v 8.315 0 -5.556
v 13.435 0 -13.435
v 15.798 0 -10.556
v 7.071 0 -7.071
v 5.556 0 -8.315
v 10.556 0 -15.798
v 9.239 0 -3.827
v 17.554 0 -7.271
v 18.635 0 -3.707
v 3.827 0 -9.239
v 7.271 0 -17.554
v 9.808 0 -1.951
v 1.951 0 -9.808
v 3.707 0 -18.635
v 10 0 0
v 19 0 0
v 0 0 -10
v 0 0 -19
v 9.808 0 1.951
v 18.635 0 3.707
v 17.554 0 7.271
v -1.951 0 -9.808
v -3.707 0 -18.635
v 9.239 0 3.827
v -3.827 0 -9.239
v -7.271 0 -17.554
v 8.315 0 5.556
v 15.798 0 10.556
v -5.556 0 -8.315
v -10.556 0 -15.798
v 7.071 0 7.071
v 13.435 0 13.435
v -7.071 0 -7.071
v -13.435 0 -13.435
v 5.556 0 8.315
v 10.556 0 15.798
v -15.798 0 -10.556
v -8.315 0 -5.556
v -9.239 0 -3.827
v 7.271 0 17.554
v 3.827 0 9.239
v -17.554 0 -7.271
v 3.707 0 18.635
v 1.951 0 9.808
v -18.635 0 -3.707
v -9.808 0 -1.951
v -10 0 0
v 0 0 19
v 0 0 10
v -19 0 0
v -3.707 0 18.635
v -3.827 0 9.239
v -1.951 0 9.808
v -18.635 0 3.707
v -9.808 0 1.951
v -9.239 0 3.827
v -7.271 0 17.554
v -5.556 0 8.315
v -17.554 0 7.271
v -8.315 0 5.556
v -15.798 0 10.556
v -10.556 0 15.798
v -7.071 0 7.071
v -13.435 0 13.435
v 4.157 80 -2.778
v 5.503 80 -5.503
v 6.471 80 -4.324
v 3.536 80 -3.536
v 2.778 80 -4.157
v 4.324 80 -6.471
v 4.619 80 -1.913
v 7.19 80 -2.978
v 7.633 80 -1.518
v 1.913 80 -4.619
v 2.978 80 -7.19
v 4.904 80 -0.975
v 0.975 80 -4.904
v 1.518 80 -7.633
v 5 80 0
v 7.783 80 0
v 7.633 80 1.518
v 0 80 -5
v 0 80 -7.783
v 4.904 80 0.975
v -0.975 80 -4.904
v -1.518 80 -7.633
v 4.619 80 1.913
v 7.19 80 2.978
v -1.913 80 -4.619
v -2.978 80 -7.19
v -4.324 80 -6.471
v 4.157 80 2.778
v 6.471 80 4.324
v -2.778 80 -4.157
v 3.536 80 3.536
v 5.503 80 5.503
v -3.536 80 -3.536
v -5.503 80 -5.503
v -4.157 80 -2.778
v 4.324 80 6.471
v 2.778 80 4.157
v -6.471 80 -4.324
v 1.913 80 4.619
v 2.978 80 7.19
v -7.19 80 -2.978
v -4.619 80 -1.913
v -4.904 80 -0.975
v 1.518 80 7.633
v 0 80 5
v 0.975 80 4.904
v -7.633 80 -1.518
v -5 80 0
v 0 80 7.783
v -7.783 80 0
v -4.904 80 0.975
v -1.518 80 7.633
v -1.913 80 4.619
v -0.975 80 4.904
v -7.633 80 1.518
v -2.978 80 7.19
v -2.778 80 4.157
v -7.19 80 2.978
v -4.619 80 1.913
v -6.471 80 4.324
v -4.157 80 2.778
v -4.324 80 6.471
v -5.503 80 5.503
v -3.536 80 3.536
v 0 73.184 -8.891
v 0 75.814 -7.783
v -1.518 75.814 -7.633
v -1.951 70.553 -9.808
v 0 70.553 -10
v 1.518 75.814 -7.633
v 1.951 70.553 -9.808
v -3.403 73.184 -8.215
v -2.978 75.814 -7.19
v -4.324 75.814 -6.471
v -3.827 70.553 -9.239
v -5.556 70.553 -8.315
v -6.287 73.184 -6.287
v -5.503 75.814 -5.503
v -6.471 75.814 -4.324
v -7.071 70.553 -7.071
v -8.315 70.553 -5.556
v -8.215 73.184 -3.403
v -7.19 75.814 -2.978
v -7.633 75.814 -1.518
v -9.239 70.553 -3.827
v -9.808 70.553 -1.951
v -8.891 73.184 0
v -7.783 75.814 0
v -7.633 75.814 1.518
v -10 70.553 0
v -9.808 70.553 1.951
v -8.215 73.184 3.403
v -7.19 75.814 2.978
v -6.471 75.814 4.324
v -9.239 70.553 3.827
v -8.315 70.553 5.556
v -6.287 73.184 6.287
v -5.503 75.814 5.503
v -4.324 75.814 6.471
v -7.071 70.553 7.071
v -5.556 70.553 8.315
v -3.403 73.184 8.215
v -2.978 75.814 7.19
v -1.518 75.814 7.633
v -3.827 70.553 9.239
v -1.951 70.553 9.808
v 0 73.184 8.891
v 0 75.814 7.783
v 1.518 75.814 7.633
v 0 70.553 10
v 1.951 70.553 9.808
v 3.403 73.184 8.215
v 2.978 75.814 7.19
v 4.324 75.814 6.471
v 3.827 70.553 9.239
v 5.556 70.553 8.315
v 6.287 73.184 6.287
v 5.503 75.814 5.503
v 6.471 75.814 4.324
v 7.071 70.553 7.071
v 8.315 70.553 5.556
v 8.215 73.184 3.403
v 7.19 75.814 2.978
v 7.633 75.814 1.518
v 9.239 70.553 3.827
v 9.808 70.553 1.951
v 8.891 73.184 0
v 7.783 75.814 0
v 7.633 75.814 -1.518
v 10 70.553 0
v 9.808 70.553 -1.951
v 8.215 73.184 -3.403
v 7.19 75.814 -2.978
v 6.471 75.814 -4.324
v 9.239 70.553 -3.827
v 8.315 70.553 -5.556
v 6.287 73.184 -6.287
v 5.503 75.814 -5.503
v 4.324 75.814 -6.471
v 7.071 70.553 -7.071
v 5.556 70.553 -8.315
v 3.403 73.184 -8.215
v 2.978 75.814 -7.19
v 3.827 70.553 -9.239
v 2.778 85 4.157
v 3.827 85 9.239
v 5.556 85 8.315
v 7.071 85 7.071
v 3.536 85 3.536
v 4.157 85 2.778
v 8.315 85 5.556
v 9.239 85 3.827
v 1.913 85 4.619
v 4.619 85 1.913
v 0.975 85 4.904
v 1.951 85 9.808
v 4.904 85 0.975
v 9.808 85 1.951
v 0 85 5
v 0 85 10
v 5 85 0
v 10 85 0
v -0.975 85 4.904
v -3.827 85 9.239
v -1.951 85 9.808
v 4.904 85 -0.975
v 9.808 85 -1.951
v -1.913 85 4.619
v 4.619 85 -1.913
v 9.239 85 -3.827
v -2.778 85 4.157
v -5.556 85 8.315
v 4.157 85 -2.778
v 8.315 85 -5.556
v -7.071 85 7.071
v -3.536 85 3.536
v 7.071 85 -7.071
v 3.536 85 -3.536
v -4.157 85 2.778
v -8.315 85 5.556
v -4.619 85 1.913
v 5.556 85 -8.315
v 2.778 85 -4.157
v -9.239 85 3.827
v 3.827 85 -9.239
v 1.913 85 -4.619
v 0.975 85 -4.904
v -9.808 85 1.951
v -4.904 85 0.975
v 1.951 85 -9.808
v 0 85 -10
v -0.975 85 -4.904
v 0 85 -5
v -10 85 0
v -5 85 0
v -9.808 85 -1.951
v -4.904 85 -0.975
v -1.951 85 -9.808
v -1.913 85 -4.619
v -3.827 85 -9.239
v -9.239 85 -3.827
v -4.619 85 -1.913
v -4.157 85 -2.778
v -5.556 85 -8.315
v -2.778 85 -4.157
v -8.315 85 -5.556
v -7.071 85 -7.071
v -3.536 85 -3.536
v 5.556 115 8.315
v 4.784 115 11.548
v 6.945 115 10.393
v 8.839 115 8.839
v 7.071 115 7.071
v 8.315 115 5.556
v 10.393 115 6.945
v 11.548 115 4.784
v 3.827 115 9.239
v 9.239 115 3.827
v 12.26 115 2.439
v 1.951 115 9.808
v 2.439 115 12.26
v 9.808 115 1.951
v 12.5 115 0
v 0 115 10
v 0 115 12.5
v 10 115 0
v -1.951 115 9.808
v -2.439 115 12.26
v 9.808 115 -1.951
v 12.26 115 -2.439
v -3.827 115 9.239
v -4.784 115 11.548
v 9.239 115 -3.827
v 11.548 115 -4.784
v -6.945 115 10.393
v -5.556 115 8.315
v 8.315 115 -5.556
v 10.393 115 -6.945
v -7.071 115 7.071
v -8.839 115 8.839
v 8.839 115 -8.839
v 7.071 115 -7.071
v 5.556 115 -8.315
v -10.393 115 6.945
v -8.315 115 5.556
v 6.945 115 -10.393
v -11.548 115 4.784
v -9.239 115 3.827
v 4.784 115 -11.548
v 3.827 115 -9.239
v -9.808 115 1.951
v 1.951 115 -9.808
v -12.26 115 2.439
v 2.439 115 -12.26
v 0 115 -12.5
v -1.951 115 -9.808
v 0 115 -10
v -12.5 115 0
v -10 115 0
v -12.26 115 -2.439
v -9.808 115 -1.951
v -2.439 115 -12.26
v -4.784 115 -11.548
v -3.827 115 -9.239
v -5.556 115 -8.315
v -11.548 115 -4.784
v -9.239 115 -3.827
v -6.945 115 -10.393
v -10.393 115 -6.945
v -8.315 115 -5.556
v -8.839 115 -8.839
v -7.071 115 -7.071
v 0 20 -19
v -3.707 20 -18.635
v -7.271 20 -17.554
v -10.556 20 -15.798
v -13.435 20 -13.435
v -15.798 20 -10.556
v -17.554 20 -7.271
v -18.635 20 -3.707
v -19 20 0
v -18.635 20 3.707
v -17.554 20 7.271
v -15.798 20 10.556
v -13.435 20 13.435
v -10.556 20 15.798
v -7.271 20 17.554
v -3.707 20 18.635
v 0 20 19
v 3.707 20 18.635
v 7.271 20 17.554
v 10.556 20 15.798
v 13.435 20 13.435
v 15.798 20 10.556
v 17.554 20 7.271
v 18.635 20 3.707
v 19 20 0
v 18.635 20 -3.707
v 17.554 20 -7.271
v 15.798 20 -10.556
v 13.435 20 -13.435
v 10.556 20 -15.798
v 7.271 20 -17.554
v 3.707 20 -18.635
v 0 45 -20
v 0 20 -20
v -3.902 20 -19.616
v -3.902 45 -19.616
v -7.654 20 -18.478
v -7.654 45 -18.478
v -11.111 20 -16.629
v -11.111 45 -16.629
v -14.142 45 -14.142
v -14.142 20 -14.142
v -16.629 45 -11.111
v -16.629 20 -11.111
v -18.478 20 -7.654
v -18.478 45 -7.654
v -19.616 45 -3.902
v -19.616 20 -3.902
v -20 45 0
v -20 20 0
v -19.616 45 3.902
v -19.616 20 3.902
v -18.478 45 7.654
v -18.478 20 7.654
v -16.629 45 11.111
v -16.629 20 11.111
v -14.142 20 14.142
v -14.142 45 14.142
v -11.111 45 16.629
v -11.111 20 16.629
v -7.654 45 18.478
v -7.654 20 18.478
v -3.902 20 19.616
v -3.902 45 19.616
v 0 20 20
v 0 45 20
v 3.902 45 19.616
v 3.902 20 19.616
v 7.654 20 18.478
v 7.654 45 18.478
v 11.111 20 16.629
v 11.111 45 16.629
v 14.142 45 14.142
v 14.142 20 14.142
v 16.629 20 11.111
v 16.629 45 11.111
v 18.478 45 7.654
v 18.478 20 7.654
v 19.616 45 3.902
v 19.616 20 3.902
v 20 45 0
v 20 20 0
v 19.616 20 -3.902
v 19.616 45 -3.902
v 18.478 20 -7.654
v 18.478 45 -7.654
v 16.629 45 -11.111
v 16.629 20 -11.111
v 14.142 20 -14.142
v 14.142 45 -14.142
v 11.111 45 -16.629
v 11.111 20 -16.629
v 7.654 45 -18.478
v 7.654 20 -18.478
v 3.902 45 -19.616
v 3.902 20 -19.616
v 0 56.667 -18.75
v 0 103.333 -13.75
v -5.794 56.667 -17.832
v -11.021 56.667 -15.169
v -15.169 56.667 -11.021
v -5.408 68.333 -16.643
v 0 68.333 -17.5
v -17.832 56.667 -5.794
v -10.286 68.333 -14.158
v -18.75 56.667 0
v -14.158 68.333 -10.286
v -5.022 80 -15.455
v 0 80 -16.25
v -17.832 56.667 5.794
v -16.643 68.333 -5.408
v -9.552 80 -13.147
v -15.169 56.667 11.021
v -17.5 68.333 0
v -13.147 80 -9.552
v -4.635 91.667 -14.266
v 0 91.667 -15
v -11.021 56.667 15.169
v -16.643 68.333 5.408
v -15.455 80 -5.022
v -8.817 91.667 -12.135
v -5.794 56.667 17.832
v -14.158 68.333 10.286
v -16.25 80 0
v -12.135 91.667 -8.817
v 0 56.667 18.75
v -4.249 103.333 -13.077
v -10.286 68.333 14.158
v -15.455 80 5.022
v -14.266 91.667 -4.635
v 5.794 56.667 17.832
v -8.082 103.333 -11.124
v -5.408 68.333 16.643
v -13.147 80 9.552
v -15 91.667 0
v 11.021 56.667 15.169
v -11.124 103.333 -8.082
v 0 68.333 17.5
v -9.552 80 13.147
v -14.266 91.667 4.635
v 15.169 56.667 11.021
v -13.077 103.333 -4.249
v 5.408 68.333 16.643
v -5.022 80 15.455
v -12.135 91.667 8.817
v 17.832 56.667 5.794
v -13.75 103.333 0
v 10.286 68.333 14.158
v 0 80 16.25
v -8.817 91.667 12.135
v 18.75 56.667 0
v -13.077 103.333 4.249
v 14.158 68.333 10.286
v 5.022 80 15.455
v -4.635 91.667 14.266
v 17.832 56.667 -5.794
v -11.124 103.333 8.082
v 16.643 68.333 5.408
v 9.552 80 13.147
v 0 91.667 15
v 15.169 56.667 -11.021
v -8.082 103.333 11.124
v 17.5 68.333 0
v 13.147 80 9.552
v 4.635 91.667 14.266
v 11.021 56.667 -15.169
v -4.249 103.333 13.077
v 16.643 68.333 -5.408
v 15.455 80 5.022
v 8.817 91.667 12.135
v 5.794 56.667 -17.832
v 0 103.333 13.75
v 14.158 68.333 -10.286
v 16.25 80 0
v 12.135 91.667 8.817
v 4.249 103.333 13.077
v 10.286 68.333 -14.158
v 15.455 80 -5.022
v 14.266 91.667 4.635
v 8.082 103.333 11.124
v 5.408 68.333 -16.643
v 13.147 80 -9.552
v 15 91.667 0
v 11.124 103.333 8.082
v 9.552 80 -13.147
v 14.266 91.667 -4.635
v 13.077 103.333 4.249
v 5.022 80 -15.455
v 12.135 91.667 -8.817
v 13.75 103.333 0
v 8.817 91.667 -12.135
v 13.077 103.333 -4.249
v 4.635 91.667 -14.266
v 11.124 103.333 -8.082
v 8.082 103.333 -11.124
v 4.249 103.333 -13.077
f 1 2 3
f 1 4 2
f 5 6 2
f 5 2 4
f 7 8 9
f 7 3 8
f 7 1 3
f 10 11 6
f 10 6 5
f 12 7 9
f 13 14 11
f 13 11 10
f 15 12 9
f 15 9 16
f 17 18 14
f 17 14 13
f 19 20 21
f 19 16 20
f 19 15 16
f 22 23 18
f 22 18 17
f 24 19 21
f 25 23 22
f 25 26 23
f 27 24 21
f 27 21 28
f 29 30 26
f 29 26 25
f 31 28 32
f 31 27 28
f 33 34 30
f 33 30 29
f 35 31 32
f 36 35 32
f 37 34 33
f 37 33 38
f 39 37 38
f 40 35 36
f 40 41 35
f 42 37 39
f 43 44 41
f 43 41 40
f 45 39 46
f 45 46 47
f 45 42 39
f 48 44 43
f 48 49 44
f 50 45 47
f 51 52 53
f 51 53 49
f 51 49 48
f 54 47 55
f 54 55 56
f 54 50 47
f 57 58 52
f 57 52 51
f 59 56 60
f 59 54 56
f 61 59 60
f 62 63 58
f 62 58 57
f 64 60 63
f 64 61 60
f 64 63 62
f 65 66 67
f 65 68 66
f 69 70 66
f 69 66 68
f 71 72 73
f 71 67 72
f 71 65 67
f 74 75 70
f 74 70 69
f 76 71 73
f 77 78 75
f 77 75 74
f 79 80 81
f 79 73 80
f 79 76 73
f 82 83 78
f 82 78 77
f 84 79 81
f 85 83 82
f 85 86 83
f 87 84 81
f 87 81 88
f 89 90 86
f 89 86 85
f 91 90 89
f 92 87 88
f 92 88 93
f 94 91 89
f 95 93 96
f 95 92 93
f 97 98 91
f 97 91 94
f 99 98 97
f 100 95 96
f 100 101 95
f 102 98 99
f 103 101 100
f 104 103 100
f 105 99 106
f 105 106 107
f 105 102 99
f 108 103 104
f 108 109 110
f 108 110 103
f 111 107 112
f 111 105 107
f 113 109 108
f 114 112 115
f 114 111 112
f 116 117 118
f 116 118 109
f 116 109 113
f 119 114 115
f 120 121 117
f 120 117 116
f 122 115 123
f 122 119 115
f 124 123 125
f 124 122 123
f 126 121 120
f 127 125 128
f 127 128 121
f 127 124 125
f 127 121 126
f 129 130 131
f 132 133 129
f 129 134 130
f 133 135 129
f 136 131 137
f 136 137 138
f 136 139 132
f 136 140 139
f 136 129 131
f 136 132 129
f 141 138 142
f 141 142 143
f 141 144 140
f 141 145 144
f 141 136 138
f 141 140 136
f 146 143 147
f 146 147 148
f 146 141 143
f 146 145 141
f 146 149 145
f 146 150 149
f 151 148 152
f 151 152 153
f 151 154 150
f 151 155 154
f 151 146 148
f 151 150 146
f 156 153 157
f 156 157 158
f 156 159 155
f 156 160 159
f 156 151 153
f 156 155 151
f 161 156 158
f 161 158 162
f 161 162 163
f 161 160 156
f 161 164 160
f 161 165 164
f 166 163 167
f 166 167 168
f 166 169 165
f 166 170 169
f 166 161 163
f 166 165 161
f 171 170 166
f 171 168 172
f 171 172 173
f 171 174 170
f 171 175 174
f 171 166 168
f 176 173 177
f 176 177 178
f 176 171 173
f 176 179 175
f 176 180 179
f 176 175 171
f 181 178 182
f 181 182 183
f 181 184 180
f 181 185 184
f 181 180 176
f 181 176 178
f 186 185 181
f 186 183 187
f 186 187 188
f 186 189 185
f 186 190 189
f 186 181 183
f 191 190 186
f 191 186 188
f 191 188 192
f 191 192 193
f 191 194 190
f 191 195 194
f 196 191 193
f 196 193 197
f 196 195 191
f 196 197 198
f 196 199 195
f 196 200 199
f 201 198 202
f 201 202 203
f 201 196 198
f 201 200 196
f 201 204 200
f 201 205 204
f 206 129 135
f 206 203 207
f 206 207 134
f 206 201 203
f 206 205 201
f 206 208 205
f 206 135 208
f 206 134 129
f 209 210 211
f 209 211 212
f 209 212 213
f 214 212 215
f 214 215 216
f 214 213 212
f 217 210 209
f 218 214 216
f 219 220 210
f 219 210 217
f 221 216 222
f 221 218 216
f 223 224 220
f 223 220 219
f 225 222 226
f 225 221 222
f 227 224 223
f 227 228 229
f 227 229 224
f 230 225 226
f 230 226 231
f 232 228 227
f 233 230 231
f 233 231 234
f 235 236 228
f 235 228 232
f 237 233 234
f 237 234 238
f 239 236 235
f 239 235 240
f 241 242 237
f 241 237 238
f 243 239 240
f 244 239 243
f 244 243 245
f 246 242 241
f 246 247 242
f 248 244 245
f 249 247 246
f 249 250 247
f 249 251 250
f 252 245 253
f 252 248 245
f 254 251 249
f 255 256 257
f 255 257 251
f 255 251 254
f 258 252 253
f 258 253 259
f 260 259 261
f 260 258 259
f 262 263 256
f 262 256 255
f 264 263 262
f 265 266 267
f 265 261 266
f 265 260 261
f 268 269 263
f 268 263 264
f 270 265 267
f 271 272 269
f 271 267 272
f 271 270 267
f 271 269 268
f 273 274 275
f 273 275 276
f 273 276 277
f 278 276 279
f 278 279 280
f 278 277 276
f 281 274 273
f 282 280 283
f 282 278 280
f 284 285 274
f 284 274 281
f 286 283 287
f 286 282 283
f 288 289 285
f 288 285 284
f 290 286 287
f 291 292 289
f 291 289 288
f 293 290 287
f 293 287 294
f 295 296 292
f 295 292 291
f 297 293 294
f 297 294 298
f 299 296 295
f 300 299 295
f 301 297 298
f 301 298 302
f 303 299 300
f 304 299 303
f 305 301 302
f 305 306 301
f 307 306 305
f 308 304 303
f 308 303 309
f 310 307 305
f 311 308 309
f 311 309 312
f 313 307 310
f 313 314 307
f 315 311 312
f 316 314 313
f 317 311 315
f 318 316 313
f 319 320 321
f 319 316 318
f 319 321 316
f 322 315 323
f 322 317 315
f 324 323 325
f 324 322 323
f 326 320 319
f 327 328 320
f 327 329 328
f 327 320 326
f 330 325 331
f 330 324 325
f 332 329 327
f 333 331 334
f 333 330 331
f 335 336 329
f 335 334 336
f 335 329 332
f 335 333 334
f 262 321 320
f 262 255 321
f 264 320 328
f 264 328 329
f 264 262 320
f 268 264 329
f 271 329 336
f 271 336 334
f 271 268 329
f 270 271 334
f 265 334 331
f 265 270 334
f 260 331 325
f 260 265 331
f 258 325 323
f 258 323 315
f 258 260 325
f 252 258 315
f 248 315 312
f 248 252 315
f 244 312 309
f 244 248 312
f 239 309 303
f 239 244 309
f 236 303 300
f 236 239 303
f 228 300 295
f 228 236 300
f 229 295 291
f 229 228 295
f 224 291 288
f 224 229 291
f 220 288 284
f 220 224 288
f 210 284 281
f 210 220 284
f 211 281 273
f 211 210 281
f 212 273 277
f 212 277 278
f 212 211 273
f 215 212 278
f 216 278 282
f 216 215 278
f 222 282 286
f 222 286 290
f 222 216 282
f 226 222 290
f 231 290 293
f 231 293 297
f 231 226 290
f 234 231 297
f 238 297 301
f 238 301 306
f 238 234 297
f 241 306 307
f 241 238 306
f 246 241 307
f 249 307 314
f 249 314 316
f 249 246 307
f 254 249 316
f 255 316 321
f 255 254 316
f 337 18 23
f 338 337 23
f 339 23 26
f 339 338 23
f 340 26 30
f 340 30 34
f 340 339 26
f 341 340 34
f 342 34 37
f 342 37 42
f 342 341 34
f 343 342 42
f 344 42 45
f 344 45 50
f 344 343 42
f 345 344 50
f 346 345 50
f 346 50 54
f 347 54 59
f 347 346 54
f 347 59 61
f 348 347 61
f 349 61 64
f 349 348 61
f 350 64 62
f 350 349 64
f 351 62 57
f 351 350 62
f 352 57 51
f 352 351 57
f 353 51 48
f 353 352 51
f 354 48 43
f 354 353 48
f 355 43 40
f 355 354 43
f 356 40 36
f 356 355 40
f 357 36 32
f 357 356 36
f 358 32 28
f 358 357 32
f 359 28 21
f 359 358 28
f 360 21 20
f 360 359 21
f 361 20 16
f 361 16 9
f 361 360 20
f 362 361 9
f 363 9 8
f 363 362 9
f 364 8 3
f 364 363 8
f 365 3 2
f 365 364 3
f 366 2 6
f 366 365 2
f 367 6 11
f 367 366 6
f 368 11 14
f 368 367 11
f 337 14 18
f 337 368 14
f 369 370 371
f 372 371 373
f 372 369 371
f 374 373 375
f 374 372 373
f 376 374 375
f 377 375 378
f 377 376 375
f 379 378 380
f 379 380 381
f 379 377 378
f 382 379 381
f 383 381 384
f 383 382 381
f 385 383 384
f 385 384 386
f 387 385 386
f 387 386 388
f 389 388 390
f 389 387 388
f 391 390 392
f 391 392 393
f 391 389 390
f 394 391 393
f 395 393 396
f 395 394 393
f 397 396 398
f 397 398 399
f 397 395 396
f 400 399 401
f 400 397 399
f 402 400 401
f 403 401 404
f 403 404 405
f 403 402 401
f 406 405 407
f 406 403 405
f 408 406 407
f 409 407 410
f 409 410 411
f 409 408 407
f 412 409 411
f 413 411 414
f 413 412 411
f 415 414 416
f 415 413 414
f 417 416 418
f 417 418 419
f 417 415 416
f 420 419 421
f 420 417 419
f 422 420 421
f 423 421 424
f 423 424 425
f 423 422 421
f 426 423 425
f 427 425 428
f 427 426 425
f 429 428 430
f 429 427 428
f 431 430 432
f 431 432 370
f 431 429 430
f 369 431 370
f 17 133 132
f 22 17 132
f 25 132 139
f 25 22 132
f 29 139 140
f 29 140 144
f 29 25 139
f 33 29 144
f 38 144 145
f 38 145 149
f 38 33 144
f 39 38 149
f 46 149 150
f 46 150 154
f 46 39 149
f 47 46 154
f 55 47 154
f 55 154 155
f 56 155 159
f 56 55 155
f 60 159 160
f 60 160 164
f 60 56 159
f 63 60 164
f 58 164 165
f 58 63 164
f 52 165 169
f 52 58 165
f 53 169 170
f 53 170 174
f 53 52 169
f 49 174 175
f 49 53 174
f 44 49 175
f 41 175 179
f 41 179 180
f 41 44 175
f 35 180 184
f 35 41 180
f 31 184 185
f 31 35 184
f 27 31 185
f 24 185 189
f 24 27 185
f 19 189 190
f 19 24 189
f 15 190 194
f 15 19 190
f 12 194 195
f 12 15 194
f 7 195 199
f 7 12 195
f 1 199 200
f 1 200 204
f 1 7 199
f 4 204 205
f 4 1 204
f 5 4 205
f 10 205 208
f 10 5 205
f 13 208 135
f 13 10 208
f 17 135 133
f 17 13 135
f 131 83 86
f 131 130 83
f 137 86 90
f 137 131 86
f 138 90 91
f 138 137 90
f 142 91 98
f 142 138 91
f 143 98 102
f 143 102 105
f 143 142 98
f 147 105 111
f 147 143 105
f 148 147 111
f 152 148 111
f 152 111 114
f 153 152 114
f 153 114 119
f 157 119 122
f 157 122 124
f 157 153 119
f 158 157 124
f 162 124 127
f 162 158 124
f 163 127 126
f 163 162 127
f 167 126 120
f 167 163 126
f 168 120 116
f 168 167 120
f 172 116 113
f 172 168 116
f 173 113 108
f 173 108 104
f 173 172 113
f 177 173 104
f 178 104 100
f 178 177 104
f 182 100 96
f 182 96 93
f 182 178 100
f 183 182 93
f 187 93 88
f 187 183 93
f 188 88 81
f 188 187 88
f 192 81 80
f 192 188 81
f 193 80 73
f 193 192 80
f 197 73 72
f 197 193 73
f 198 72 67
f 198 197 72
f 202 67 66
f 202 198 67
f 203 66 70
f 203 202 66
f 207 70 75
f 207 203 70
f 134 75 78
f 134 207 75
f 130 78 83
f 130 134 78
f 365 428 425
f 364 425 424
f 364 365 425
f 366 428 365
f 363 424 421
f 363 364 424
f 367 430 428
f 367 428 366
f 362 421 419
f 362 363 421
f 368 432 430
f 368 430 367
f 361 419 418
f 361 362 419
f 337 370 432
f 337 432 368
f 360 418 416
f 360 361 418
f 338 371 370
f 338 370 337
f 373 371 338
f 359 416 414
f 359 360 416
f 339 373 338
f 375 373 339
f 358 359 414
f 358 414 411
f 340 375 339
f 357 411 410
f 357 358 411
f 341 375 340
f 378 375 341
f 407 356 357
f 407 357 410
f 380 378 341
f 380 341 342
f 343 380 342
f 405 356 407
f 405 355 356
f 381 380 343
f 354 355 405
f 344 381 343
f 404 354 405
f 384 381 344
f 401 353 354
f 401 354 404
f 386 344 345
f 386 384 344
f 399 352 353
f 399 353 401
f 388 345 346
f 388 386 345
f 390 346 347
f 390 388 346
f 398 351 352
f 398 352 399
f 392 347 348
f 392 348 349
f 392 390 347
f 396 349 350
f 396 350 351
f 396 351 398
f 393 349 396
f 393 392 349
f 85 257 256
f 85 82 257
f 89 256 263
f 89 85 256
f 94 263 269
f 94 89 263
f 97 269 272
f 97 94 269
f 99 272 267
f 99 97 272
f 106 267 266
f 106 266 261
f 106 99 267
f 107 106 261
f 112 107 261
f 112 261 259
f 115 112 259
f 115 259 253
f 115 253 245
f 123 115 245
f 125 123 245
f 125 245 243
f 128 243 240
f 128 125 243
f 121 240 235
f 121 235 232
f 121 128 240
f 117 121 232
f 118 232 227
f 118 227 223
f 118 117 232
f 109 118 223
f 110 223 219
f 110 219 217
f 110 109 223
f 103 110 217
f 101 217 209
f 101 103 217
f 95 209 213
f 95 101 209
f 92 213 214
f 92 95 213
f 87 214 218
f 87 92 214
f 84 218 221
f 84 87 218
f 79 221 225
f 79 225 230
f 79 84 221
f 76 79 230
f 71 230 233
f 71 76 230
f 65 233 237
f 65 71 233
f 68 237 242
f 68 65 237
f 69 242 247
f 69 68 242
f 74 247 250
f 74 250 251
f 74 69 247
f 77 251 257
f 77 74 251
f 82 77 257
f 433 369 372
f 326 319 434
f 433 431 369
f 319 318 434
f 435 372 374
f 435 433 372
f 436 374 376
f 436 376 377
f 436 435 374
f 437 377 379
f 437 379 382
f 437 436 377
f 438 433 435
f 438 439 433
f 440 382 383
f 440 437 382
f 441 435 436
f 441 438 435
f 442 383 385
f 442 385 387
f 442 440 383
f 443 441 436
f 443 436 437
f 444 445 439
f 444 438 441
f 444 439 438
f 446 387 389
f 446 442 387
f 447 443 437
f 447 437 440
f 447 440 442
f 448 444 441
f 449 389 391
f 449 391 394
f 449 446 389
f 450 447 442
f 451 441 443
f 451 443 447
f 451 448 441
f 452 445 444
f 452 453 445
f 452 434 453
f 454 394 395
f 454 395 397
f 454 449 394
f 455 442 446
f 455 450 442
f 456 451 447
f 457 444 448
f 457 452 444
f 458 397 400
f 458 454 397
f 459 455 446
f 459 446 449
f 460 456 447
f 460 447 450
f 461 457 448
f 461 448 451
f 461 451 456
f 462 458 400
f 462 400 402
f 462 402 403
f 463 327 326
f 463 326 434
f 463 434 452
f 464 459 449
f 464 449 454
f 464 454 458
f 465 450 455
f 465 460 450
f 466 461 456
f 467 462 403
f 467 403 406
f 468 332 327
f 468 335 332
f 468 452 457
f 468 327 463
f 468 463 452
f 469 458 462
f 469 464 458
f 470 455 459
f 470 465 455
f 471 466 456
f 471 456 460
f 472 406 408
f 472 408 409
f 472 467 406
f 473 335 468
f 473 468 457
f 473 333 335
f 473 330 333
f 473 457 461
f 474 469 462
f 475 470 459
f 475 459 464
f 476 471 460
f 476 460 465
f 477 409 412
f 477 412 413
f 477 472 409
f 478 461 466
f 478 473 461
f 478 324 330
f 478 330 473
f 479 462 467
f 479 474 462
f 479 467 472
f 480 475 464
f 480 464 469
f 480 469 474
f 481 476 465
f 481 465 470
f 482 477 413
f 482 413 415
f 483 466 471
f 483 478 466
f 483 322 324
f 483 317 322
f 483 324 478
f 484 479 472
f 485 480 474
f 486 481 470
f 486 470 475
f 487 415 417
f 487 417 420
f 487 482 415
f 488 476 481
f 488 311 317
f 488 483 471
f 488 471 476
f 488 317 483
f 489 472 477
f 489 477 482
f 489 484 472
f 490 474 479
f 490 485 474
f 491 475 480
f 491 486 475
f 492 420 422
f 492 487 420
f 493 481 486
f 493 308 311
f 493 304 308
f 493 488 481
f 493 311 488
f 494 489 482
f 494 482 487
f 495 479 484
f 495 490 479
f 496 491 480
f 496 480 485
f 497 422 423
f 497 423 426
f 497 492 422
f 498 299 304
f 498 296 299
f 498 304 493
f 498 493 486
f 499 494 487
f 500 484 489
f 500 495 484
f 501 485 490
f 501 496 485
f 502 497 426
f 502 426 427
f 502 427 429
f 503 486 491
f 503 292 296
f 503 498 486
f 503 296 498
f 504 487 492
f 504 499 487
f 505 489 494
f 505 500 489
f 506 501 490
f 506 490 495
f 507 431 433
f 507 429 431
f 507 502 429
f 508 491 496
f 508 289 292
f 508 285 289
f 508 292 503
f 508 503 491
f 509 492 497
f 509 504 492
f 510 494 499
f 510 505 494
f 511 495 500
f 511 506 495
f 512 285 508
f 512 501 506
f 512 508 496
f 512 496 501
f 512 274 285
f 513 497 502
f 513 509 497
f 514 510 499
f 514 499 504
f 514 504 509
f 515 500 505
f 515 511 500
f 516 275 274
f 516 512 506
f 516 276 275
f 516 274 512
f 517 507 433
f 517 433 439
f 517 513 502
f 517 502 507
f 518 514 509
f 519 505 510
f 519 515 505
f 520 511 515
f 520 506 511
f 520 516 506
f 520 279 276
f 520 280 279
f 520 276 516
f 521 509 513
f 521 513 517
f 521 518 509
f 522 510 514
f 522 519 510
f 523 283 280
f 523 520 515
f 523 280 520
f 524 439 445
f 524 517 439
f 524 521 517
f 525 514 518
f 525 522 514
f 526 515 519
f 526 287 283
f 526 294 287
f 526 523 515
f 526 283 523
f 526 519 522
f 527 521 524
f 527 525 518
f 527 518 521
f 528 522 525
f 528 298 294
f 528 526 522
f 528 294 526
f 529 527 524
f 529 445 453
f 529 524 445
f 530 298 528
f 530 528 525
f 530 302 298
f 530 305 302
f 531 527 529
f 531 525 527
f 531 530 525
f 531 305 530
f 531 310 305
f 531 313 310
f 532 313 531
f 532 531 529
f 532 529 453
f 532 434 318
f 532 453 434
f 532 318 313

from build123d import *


with BuildPart() as part:
    # 스케치1 → 회전1 (revolve)
    with BuildSketch(Plane.XY, mode=Mode.PRIVATE) as revolve_1_sk:
        Polygon((10, 0), (19, 0), (19, 20), (20, 20), (20, 45), (12.5, 115), (10, 115), (10, 85), (5, 85), (5, 80), (7.782730507, 80), (7.782730507, 75.813819554), (10, 70.553192673), align=None)
    revolve(revolve_1_sk.sketch.rotate(Axis((0, 0, 0), (0, 1, 0)), 90), axis=Axis((0, 0, 0), (0, 1, 0)))


solid = part.part
